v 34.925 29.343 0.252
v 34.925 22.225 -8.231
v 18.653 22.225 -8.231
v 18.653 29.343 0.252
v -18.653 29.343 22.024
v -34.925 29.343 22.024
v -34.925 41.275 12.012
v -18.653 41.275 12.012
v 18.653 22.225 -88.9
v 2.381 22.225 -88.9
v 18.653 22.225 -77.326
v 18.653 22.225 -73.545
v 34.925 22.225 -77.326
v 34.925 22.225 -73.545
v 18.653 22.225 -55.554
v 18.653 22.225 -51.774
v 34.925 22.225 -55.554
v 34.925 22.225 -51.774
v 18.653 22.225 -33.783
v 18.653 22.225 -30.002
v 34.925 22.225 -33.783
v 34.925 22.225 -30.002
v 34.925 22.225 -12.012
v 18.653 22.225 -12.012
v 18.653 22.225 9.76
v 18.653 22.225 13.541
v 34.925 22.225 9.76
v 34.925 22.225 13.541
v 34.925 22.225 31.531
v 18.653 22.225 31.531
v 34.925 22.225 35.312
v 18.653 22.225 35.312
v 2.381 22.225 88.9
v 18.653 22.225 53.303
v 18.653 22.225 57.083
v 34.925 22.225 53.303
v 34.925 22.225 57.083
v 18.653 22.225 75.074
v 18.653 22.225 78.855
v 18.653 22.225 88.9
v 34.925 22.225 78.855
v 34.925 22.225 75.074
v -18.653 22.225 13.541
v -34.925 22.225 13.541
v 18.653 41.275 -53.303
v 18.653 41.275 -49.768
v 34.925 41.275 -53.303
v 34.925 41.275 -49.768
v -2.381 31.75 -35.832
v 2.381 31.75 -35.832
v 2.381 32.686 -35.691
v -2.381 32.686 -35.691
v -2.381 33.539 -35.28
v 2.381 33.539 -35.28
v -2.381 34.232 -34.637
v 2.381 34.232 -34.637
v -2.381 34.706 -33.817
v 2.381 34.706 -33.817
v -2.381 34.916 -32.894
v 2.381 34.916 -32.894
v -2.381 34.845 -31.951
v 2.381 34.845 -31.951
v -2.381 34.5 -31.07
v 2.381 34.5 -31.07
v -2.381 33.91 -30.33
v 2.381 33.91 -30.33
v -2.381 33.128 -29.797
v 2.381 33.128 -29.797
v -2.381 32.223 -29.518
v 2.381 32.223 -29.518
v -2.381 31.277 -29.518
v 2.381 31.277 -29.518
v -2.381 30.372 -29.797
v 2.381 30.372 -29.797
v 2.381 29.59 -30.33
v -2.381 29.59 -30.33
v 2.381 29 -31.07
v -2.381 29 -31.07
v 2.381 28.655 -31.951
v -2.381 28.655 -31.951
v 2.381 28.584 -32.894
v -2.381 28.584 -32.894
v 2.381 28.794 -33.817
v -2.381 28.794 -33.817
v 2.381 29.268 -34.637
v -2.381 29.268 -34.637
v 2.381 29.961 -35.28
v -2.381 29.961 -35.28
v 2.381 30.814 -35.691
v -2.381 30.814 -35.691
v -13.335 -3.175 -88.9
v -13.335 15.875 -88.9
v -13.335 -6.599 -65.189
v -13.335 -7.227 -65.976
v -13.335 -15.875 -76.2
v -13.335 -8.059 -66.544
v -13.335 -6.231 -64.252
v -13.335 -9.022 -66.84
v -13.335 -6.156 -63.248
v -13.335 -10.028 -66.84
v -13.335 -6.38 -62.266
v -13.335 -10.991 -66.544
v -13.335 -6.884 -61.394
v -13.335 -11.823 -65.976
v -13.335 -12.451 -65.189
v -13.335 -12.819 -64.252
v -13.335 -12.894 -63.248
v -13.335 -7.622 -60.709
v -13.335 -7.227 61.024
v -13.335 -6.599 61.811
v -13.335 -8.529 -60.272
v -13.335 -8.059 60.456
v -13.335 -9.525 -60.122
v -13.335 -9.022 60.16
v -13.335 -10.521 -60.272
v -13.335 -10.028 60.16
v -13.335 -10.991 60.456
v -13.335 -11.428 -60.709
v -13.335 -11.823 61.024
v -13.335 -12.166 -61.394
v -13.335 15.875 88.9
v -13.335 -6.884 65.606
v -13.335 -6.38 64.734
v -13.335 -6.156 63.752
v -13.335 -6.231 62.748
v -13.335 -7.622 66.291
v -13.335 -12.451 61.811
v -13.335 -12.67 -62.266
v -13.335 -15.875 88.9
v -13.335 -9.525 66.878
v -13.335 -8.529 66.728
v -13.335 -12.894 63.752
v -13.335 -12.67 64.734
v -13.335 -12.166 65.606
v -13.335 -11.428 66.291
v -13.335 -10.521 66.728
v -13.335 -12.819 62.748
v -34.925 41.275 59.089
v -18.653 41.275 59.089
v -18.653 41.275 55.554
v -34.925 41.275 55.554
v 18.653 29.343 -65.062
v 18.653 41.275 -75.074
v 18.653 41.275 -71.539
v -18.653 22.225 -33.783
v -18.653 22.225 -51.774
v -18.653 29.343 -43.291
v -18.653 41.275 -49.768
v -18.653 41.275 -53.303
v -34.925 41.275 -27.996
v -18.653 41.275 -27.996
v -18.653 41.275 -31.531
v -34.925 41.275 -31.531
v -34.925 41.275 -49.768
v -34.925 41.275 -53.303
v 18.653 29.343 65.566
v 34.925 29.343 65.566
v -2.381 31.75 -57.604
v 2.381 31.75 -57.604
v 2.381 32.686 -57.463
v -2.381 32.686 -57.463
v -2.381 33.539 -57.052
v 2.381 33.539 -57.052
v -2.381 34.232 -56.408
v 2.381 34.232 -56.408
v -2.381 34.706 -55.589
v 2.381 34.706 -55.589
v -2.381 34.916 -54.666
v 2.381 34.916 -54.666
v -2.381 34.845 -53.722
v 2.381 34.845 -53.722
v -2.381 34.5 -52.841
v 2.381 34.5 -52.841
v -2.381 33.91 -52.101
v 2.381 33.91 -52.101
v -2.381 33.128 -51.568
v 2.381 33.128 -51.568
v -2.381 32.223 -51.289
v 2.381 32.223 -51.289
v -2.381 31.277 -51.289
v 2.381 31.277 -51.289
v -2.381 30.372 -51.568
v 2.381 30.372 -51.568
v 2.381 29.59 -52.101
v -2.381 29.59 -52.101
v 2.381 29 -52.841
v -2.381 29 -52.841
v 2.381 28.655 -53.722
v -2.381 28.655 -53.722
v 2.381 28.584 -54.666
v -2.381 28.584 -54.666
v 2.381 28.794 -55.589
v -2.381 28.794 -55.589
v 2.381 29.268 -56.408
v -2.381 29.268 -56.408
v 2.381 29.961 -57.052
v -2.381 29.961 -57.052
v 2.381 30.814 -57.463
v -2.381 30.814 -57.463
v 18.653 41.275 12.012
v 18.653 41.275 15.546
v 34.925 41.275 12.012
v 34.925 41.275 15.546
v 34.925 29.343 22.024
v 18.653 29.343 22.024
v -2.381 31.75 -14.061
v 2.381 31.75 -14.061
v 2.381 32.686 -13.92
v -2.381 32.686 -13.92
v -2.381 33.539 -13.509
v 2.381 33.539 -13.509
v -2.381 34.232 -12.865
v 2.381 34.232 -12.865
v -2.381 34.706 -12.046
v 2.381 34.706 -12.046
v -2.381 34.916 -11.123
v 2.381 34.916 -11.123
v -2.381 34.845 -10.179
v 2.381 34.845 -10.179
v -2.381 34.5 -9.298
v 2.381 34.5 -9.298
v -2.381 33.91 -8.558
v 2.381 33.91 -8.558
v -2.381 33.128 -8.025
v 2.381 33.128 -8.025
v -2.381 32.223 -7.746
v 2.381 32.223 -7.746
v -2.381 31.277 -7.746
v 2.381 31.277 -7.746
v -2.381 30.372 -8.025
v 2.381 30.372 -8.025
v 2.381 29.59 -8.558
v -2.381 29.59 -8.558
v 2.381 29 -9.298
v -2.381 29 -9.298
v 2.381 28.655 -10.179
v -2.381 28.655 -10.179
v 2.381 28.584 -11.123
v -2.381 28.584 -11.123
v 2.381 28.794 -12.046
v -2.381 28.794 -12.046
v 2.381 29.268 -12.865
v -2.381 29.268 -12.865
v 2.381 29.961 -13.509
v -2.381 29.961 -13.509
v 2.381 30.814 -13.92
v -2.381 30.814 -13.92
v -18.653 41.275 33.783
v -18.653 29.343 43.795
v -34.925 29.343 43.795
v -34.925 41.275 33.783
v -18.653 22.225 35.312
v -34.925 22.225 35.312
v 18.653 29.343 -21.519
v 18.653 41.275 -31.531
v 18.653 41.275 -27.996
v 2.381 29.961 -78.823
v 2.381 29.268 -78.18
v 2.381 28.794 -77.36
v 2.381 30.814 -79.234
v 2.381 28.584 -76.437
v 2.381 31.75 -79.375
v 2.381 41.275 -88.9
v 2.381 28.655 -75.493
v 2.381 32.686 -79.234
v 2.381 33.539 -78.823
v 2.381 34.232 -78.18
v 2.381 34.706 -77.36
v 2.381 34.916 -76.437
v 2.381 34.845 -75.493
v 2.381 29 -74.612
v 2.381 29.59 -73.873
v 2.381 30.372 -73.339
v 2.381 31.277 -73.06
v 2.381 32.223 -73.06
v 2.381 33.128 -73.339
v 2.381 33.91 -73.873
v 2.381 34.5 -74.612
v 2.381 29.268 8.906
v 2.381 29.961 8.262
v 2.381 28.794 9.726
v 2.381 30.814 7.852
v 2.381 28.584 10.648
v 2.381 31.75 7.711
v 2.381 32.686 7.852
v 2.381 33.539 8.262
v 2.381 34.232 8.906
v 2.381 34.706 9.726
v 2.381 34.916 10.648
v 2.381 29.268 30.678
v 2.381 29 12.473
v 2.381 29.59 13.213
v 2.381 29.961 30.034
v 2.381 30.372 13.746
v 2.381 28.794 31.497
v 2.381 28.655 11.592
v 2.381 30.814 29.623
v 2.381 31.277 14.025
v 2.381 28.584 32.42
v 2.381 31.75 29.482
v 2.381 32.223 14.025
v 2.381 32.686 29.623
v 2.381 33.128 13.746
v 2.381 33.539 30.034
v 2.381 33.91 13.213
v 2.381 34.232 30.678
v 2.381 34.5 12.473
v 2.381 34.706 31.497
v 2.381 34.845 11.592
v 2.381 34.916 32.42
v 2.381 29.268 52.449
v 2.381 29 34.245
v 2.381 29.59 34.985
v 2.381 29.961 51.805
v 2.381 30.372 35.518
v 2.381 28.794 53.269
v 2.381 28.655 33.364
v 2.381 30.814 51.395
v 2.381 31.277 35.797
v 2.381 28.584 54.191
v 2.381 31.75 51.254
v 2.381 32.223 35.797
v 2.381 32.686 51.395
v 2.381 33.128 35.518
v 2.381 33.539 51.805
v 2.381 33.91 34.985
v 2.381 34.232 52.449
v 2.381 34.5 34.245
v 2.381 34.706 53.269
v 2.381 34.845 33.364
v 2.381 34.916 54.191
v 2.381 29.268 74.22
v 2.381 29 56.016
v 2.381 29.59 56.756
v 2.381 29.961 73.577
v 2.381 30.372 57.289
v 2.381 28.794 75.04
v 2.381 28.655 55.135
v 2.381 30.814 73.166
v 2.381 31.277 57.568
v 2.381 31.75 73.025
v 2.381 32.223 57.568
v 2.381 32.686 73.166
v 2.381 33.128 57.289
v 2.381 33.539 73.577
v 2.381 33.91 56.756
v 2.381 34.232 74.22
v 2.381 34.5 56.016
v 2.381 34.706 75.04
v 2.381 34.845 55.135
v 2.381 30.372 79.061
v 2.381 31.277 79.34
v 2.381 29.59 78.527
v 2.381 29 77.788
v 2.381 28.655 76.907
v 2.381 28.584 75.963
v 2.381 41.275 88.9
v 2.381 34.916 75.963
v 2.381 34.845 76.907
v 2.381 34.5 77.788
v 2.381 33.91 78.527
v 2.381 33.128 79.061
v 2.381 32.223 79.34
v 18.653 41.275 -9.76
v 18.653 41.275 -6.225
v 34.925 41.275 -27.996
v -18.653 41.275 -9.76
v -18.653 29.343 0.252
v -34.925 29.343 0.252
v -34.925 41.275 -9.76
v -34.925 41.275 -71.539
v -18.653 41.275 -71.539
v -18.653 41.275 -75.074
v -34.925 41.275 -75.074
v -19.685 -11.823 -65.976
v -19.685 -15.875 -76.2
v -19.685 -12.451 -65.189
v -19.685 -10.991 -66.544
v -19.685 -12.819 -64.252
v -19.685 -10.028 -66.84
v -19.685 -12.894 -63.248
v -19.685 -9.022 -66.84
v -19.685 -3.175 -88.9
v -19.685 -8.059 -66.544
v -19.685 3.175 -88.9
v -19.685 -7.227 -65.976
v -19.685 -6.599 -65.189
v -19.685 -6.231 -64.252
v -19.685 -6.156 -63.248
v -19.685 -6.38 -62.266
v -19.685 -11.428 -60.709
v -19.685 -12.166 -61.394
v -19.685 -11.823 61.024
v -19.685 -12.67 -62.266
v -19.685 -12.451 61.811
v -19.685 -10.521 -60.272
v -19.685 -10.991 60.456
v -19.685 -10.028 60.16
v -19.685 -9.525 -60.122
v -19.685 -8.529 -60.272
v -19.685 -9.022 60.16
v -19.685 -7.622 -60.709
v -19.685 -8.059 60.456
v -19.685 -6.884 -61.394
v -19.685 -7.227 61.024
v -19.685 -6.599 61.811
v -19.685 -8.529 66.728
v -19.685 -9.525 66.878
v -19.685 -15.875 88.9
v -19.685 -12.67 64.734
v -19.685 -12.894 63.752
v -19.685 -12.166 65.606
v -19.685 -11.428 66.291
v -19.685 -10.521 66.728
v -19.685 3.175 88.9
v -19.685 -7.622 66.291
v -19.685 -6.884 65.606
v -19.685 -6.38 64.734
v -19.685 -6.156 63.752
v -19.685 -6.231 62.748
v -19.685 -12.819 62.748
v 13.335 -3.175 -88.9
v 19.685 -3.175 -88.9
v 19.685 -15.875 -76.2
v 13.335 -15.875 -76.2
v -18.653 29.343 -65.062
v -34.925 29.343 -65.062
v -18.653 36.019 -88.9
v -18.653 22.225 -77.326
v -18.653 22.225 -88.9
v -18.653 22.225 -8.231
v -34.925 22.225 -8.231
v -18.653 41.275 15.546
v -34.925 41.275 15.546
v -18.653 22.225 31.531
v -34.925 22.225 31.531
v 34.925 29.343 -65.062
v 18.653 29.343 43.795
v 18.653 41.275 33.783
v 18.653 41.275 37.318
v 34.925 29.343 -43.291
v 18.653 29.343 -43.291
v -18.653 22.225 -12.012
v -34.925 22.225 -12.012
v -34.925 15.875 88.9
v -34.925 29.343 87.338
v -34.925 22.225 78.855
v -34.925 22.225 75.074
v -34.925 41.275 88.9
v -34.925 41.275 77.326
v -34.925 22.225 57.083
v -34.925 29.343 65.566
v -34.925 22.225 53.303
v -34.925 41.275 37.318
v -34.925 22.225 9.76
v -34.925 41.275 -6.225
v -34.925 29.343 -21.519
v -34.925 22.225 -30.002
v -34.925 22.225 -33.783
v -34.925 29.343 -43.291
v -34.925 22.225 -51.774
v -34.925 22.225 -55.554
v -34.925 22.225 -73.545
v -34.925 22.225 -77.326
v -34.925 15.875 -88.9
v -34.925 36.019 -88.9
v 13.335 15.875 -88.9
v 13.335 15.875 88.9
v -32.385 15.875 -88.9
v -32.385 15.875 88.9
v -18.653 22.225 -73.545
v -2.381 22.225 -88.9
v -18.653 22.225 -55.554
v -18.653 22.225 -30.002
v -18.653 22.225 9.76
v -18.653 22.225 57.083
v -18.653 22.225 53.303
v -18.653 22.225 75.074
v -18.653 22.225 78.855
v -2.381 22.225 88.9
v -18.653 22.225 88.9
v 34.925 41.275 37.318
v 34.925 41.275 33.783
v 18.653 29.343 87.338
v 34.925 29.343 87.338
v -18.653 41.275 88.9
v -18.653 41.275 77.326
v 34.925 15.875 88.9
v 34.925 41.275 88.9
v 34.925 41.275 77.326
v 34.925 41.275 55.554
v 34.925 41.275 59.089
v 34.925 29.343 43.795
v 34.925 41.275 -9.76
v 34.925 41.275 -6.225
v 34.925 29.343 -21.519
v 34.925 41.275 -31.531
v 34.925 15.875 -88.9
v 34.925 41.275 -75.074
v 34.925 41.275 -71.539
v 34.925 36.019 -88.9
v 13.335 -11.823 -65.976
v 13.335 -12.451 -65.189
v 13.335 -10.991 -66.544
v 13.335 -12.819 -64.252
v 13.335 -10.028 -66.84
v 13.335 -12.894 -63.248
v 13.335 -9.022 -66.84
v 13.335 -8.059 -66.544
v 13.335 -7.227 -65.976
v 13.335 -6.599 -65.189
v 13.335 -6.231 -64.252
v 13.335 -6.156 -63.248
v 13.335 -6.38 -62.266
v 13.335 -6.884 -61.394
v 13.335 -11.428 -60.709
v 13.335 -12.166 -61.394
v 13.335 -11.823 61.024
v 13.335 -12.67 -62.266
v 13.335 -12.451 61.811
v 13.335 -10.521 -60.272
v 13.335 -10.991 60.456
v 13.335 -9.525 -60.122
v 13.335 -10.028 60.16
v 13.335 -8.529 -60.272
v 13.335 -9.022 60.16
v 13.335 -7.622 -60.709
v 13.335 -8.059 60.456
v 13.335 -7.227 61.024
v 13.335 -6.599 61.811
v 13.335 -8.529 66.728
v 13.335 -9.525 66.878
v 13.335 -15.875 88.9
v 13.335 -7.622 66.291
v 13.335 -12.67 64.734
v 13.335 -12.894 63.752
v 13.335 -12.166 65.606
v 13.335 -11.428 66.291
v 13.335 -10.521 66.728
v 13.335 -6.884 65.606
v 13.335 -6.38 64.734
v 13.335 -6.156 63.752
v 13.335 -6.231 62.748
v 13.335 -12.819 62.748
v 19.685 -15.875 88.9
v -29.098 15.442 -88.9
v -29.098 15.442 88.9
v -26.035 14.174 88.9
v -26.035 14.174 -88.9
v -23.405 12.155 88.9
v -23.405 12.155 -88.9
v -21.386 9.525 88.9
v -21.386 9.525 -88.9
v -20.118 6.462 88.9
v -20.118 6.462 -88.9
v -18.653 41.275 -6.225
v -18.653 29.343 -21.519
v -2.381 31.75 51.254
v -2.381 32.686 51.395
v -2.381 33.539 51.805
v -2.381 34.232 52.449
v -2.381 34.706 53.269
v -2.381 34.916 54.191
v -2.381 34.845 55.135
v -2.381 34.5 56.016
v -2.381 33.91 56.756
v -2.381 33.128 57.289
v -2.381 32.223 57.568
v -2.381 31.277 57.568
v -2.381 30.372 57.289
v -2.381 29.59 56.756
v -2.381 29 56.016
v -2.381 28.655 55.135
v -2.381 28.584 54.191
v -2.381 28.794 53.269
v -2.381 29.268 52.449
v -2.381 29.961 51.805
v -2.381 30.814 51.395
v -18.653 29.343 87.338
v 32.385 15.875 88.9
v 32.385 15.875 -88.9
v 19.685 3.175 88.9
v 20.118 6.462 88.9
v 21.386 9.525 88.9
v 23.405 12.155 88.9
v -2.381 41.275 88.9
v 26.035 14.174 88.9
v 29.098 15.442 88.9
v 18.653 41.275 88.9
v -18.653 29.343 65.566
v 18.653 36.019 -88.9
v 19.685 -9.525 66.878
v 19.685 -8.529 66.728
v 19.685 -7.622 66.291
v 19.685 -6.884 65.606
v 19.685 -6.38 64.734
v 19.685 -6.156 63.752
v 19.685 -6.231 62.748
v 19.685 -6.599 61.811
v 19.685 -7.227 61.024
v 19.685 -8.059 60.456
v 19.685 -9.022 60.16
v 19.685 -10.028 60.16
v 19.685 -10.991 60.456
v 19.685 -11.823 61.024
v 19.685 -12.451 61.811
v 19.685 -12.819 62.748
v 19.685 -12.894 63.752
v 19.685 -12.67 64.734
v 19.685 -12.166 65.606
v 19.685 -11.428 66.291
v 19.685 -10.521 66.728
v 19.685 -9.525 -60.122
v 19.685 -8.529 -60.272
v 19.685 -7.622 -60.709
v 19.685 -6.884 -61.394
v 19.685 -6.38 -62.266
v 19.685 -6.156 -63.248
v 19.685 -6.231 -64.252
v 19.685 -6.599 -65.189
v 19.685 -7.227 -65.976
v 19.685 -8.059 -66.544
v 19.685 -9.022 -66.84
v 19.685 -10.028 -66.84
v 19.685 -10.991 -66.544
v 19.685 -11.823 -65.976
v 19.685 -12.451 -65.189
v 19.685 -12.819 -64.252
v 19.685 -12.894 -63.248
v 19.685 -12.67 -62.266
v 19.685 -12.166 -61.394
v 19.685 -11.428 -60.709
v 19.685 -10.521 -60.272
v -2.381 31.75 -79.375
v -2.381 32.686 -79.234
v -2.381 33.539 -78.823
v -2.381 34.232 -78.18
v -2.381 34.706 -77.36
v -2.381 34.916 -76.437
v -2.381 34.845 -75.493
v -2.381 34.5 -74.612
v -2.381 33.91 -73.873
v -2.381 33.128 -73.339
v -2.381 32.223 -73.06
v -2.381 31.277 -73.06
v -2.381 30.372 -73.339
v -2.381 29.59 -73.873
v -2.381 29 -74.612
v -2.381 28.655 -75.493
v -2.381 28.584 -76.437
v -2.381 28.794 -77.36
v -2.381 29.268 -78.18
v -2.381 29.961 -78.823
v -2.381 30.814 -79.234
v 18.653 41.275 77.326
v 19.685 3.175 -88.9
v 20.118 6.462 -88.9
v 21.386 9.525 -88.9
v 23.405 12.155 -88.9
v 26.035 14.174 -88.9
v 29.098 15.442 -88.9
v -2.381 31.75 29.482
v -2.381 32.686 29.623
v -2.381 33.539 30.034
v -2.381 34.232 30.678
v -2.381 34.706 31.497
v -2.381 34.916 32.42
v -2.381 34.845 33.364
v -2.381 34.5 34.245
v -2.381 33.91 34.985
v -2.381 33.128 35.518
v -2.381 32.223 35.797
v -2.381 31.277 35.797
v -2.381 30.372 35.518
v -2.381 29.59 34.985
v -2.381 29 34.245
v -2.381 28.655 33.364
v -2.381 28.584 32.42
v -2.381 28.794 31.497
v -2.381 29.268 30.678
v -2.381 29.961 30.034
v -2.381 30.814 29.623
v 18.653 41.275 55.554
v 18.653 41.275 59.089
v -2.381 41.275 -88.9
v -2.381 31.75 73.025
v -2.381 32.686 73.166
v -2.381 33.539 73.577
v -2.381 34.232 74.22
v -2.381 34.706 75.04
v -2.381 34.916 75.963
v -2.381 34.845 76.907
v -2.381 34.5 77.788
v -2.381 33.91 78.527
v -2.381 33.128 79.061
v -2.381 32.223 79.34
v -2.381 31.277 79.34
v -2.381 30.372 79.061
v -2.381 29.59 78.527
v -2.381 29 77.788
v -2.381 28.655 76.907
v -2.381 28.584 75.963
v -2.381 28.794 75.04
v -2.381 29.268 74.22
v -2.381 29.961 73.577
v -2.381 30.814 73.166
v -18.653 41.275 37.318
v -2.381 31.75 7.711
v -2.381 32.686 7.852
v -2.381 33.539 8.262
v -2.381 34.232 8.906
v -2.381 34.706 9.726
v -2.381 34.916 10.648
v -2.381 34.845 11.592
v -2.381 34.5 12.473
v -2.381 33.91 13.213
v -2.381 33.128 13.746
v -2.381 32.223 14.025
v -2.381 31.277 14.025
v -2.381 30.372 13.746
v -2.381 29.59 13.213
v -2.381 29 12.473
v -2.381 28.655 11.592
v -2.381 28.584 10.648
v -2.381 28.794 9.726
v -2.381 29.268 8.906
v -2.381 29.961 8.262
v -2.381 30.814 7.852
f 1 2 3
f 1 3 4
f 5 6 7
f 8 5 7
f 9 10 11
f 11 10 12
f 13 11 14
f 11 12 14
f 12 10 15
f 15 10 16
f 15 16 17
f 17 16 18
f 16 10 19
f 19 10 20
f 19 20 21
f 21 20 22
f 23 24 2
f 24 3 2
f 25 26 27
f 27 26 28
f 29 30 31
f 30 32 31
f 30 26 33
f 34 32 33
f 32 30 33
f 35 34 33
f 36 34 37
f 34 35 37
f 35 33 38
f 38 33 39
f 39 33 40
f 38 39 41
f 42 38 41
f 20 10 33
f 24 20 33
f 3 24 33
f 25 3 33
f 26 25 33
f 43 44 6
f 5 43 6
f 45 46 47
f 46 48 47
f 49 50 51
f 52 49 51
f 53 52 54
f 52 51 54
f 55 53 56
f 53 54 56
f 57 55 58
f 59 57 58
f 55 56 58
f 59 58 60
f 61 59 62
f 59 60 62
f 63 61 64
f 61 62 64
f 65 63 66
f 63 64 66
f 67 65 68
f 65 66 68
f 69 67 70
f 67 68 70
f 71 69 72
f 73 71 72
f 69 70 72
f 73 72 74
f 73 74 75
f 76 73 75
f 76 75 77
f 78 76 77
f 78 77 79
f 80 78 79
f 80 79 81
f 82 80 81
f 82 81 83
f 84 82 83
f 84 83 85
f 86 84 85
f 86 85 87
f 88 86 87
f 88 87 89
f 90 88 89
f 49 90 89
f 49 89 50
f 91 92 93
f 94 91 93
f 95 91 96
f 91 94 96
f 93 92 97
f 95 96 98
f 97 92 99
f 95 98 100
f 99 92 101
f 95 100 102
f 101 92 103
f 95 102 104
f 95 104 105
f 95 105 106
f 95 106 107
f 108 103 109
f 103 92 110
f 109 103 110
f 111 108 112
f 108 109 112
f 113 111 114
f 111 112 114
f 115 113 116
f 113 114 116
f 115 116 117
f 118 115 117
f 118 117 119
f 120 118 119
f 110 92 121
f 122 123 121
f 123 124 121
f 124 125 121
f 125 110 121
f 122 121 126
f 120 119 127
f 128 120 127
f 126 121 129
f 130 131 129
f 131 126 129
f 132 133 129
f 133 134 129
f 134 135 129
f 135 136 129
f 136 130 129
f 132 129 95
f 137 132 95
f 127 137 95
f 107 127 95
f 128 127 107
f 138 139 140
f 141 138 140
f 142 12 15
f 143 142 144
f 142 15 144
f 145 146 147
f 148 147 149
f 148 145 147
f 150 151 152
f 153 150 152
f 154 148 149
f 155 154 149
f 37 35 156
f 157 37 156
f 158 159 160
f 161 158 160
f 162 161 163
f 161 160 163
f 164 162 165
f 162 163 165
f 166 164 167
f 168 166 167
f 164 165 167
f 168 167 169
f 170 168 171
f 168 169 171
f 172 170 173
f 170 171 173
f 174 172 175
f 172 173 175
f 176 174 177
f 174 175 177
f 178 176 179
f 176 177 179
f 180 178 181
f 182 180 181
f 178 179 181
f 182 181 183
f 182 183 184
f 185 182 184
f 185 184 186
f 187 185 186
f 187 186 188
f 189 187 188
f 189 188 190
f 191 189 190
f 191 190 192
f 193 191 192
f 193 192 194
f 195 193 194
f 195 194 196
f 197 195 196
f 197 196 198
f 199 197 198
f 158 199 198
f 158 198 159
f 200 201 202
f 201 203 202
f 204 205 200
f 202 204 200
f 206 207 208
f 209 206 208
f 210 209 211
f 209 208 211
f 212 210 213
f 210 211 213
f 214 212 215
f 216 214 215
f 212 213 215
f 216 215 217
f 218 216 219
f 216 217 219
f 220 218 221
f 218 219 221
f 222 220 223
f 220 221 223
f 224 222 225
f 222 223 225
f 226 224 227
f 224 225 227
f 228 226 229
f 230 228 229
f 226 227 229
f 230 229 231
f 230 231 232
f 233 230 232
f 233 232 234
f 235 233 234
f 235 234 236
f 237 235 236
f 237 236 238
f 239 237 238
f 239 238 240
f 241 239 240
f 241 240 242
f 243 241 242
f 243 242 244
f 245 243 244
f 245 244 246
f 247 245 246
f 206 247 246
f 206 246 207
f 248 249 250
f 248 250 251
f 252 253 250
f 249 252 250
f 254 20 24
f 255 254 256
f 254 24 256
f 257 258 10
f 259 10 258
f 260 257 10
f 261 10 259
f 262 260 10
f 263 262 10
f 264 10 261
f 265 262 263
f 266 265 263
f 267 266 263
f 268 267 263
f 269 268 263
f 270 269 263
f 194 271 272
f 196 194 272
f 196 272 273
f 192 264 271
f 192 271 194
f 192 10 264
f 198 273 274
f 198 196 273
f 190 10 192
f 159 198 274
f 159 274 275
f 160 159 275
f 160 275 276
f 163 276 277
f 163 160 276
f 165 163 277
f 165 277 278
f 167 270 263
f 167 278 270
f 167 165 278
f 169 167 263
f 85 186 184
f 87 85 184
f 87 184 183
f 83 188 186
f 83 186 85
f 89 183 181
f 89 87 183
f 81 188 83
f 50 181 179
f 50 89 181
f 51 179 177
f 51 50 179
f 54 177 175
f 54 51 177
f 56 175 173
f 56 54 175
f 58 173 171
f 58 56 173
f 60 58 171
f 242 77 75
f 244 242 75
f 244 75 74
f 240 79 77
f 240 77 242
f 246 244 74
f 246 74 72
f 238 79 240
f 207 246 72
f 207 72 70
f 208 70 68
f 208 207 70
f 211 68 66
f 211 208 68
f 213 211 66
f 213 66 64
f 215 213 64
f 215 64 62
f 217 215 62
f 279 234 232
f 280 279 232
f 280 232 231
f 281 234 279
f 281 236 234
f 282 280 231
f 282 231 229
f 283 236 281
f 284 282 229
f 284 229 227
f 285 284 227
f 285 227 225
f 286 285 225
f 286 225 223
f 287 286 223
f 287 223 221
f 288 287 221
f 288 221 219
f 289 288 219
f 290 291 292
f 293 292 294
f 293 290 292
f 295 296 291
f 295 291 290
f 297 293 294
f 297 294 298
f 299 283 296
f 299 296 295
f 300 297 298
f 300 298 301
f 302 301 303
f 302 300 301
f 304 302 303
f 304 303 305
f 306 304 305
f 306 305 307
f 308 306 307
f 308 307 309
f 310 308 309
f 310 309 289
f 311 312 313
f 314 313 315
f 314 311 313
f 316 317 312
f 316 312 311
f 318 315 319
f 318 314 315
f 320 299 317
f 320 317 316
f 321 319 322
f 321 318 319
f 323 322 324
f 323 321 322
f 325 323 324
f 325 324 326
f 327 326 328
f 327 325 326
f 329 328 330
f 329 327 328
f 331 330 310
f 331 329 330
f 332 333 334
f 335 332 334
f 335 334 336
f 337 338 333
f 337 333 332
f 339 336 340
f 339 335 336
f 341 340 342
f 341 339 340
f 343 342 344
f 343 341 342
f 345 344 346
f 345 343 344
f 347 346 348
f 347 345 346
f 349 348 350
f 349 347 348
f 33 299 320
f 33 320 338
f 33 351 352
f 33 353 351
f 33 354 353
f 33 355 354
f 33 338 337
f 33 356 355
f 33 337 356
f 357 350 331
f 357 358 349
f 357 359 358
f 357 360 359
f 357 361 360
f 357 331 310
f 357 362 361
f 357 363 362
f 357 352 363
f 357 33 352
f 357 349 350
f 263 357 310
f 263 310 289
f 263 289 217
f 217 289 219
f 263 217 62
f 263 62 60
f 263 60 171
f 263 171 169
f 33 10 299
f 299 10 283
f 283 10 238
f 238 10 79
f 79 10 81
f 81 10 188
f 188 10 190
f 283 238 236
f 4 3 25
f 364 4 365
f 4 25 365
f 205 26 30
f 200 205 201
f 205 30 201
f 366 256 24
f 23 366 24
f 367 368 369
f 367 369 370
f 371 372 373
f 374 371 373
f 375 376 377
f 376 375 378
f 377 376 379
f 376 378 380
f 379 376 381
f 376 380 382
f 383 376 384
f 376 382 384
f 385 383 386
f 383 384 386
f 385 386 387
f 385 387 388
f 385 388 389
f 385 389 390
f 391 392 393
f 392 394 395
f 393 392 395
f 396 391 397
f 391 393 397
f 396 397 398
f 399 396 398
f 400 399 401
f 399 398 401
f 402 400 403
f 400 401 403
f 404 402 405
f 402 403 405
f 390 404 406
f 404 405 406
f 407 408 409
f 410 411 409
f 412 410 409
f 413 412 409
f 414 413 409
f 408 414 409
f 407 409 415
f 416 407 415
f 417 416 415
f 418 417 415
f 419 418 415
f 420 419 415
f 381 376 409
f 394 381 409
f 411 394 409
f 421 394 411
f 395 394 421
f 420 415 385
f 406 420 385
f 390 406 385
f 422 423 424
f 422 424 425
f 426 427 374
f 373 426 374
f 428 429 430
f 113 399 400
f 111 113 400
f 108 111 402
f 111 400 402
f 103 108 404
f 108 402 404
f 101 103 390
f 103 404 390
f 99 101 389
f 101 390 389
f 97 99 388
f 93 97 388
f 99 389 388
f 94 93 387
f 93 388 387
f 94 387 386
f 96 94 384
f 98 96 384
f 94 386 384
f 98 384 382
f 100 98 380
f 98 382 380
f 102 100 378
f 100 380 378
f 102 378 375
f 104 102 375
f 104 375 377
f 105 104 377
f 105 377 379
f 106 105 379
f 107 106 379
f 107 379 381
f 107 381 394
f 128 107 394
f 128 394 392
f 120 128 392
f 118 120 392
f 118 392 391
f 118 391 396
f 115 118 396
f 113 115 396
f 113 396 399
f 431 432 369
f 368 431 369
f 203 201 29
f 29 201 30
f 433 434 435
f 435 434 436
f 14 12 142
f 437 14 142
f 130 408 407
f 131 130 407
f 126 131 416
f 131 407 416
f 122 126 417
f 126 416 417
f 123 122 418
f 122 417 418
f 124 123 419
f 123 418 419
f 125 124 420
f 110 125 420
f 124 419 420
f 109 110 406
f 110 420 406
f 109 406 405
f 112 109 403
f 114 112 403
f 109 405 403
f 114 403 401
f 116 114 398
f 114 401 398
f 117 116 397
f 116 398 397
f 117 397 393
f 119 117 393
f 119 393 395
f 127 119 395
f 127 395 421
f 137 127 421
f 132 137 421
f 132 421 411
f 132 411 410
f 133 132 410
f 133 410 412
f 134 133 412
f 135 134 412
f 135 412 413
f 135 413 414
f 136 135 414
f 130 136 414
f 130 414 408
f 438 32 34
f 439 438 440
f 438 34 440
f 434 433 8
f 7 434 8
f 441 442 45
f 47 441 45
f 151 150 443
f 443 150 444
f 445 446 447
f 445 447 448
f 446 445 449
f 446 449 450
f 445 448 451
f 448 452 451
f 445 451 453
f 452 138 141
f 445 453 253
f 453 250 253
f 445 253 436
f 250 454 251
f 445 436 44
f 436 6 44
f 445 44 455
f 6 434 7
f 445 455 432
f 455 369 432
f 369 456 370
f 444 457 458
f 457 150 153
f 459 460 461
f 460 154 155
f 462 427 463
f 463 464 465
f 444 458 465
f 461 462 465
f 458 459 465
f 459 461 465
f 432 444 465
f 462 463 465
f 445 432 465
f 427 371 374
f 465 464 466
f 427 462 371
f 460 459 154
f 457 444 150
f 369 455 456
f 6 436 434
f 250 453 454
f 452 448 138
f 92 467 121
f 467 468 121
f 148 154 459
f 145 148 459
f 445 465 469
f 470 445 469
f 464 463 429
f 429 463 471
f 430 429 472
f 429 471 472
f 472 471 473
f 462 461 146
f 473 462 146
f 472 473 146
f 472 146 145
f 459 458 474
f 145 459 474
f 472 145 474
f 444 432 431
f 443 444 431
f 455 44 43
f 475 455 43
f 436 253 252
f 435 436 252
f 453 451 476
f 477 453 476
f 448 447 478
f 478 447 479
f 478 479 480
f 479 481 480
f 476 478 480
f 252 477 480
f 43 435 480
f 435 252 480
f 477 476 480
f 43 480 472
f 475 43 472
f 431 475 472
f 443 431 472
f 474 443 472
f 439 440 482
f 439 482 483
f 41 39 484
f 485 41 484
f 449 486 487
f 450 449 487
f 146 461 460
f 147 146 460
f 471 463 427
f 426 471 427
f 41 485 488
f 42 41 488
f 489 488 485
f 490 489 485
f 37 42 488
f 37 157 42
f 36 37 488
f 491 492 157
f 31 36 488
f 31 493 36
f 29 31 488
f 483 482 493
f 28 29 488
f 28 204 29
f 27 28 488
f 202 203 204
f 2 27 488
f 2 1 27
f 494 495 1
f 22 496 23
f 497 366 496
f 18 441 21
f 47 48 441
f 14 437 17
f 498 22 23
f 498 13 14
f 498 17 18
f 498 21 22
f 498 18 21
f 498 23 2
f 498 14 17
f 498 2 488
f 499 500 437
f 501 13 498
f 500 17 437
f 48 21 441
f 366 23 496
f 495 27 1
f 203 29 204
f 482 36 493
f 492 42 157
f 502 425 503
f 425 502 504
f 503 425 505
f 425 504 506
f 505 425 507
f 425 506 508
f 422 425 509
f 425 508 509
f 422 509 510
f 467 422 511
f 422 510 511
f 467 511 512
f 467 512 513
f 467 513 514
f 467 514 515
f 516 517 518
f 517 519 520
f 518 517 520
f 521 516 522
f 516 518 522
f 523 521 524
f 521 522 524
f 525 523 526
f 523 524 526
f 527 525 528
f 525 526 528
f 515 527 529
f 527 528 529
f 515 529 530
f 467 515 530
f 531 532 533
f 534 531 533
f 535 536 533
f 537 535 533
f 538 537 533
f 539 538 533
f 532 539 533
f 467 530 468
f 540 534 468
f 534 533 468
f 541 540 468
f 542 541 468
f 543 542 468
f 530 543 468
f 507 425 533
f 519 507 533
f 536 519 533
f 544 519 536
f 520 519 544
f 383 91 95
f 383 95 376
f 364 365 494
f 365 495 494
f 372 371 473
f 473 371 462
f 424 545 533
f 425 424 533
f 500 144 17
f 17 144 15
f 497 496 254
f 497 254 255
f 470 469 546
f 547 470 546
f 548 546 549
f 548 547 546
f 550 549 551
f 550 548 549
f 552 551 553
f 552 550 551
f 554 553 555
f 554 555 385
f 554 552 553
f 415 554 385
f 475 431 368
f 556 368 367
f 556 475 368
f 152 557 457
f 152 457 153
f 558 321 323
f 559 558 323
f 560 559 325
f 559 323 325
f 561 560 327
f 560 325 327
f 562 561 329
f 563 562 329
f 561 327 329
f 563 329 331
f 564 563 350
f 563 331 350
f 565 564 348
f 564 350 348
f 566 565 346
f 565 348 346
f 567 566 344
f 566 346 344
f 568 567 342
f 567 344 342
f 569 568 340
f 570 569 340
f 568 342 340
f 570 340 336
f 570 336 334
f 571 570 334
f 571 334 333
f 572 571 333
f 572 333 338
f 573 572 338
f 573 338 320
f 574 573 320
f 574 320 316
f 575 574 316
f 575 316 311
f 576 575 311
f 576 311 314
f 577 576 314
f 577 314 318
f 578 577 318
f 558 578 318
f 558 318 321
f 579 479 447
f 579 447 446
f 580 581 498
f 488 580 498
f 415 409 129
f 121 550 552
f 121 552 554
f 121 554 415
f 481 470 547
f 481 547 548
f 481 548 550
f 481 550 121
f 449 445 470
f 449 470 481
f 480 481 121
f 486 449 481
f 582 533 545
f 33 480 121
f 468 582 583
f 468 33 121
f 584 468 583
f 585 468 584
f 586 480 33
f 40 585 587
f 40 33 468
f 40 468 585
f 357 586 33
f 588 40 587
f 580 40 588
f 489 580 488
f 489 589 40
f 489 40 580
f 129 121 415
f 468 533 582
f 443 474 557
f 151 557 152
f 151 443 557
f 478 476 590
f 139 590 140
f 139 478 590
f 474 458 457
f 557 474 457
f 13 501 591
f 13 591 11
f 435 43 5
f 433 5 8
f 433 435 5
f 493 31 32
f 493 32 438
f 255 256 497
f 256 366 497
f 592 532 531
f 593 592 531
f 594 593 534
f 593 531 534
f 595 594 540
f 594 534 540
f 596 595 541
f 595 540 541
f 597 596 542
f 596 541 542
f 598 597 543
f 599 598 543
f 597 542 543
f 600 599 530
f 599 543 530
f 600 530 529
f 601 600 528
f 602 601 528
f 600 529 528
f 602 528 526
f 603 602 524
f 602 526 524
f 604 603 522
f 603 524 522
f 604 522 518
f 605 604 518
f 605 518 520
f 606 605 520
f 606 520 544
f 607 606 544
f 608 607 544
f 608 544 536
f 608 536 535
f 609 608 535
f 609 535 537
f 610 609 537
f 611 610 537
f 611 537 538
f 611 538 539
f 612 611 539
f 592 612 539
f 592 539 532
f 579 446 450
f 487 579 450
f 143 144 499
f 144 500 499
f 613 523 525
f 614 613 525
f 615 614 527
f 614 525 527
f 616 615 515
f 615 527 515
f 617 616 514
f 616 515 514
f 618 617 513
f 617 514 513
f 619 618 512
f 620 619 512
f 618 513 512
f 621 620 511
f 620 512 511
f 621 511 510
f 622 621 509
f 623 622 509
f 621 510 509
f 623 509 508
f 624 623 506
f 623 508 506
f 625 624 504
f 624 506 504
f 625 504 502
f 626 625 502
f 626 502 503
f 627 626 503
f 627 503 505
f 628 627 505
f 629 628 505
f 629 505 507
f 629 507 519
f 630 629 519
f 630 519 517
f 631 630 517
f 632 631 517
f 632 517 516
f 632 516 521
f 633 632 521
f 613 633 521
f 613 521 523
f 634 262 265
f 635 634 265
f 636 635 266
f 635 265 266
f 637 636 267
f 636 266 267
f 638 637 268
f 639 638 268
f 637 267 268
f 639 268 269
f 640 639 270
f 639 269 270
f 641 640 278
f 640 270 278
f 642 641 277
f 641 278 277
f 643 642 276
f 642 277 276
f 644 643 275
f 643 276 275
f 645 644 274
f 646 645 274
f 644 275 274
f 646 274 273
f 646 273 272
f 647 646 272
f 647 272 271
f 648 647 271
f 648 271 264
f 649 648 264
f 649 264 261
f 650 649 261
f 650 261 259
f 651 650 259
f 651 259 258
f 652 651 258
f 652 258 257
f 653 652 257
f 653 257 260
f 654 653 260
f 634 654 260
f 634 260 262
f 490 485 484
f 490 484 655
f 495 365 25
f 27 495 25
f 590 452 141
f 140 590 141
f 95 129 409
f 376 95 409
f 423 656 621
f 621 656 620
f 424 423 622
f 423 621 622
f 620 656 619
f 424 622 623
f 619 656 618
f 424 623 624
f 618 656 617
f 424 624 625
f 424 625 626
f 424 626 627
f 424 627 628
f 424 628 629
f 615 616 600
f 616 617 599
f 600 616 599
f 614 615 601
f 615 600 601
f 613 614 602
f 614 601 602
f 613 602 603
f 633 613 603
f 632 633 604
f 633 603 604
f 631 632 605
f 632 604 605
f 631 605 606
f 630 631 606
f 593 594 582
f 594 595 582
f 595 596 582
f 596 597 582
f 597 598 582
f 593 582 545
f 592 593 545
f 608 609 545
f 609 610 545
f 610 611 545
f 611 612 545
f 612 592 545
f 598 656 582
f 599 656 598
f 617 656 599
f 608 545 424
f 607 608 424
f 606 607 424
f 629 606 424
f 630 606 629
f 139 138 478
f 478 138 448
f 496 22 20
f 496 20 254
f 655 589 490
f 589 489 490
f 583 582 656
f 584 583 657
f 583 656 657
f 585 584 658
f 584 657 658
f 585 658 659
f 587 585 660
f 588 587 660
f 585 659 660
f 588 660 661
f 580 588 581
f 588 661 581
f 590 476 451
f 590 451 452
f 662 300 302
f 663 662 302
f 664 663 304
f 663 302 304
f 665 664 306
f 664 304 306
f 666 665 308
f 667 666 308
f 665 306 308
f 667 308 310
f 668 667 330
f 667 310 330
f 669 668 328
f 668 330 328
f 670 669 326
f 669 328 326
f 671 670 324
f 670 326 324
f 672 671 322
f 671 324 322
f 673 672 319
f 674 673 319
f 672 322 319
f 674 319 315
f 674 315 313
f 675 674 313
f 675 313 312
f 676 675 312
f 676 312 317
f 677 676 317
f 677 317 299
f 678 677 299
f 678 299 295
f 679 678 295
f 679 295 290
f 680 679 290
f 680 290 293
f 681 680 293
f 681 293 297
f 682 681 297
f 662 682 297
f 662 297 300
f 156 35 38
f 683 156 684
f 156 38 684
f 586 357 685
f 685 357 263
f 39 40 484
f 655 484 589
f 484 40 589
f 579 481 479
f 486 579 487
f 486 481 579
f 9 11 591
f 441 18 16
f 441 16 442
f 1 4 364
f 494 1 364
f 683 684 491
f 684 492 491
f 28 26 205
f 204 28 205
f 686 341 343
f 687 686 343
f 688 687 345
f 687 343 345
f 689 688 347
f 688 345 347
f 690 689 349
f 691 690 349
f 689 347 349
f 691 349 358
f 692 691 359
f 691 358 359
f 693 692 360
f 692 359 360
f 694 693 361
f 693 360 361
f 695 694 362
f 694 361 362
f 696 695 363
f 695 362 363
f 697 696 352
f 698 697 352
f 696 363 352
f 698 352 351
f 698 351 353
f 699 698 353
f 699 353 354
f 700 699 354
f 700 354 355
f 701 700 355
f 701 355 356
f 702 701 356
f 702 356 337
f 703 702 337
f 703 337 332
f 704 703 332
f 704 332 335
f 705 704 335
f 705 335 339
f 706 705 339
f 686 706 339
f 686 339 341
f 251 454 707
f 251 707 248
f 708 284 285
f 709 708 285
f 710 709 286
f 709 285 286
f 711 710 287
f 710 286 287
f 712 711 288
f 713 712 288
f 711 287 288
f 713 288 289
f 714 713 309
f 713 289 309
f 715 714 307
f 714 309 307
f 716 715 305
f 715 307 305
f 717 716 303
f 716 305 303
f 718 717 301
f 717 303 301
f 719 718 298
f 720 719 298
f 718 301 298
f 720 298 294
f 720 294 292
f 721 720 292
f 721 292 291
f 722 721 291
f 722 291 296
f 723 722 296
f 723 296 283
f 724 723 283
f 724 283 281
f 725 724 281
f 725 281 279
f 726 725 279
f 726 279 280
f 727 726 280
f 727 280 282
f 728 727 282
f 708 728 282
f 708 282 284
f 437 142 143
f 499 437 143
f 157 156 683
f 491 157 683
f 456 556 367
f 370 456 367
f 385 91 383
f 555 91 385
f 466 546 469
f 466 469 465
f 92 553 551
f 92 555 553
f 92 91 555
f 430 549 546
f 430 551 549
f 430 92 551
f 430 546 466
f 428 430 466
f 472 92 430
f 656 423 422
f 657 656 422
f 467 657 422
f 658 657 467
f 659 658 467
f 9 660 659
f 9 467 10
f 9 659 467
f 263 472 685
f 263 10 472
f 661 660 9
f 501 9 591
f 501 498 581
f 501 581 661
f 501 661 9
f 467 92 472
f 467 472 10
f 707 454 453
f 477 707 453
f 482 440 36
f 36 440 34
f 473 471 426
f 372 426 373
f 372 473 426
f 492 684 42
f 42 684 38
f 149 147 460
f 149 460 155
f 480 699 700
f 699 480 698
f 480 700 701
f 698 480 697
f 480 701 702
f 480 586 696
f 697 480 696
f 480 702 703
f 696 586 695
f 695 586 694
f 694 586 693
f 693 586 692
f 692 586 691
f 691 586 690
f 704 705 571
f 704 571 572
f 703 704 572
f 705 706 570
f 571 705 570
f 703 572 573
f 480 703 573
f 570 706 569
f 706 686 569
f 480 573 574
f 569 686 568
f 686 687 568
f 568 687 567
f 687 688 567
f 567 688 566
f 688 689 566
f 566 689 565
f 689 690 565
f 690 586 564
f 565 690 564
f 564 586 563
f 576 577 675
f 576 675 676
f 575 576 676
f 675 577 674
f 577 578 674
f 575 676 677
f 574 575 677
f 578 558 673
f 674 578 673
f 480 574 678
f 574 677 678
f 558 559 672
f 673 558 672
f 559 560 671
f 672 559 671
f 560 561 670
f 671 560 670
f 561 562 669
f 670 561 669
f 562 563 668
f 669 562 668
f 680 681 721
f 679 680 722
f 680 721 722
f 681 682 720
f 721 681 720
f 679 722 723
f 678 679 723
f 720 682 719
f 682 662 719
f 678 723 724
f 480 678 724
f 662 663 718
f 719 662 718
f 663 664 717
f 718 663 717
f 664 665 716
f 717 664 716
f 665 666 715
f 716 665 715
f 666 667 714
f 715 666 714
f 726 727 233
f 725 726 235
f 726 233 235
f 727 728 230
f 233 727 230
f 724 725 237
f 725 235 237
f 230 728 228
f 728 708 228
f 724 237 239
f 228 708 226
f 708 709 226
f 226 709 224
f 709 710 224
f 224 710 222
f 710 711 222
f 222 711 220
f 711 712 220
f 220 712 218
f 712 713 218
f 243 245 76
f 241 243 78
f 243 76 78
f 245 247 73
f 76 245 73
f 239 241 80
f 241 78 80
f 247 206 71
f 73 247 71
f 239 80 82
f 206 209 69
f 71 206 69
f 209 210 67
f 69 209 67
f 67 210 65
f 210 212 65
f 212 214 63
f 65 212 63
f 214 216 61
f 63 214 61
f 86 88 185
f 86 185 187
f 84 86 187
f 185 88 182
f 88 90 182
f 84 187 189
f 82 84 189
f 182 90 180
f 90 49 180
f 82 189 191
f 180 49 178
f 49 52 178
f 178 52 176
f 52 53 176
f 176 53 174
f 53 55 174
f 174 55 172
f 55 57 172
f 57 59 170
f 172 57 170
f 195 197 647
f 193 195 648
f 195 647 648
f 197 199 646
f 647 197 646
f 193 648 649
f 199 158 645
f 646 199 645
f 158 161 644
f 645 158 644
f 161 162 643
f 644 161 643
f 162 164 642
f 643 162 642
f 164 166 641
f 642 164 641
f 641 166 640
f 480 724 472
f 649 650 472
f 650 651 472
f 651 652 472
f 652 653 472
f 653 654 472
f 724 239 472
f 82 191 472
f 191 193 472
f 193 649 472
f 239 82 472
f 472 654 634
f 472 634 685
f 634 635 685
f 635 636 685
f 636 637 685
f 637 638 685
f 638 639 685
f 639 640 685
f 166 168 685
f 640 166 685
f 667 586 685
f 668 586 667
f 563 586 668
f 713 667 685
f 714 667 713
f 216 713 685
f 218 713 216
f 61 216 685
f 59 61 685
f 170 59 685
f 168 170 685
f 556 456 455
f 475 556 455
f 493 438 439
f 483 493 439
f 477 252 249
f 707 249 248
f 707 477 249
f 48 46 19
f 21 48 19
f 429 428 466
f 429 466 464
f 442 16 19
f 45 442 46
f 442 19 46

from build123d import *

# Parameters (mm, degrees)
BOSS_EXTRUDE1_DEPTH             = 88.9
F_1_4_CLEARANCE_HOLE1_D         = 6.7564
CHAMFER1_SIZE                   = 12.7
SKETCH8_W                       = 69.85
SKETCH8_H                       = 177.8
BOSS_EXTRUDE4_DEPTH             = 6.35
SKETCH4_W                       = 177.8
SKETCH4_H                       = 19.05
BOSS_EXTRUDE2_DEPTH             = 2.38125
F_1_4_0_25_DIAMETER_HOLE1_D     = 6.35
F_1_4_0_25_DIAMETER_HOLE1_DEPTH = 11.938
F_1_4_0_25_DIAMETER_HOLE1_TIP   = 1.907732465
FILLET3_R                       = 12.7
BOSS_EXTRUDE7_DEPTH             = 34.925
SKETCH31_W                      = 16.271875
SKETCH31_H                      = 19.05
CUT_EXTRUDE1_DEPTH              = 186.839234959


with BuildPart() as part:
    # Sketch1 → Boss-Extrude1 (new, symmetric)
    with BuildSketch(Plane.XY):
        Polygon((-19.685, 22.225), (19.685, 22.225), (19.685, -15.875), (13.335, -15.875), (13.335, 15.875), (-13.335, 15.875), (-13.335, -15.875), (-19.685, -15.875), align=None)
    extrude(amount=BOSS_EXTRUDE1_DEPTH, both=True)

    # 1/4 Clearance Hole1 (through all)
    with Locations(Plane(origin=(19.685, 0, 0), x_dir=(0, 0, -1), z_dir=(1, 0, 0))):
        with Locations((-63.5, -9.525), (63.5, -9.525)):
            Hole(F_1_4_CLEARANCE_HOLE1_D / 2)

    # Chamfer1
    chamfer1_edges = [part.edges().sort_by_distance(p)[0] for p in [
        (16.51, -15.875, -88.9),
        (-16.51, -15.875, -88.9),
    ]]
    chamfer(chamfer1_edges, length=CHAMFER1_SIZE)

    # Sketch8 → Boss-Extrude4 (add)
    with BuildSketch(Plane(origin=(0, 22.225, 0), x_dir=(1, 0, 0), z_dir=(0, 1, 0))):
        Rectangle(SKETCH8_W, SKETCH8_H)
    extrude(amount=-BOSS_EXTRUDE4_DEPTH)

    # Sketch4 → Boss-Extrude2 (add, symmetric)
    with BuildSketch(Plane(origin=(0, 0, 0), x_dir=(0, 0, -1), z_dir=(1, 0, 0))):
        with Locations((0, 31.75)):
            Rectangle(SKETCH4_W, SKETCH4_H)
    extrude(amount=BOSS_EXTRUDE2_DEPTH, both=True)

    # 1/4 (0.25) Diameter Hole1
    with Locations(Plane.ZY.offset(2.38125)):
        with Locations((-76.2, 31.75), (76.2, 31.75), (54.428571429, 31.75), (32.657142857, 31.75), (10.885714286, 31.75), (-10.885714286, 31.75), (-32.657142857, 31.75), (-54.428571429, 31.75)):
            Hole(F_1_4_0_25_DIAMETER_HOLE1_D / 2, depth=F_1_4_0_25_DIAMETER_HOLE1_DEPTH)
            with Locations((0, 0, -(F_1_4_0_25_DIAMETER_HOLE1_DEPTH + F_1_4_0_25_DIAMETER_HOLE1_TIP / 2))):  # 118° drill point
                Cone(0, F_1_4_0_25_DIAMETER_HOLE1_D / 2, F_1_4_0_25_DIAMETER_HOLE1_TIP, mode=Mode.SUBTRACT)

    # Fillet3
    fillet3_edges = [part.edges().sort_by_distance(p)[0] for p in [
        (19.685, 15.875, 0),
        (-19.685, 15.875, 0),
    ]]
    fillet(fillet3_edges, radius=FILLET3_R)

    # Sketch30 → Boss-Extrude7 (add, symmetric)
    with BuildSketch(Plane(origin=(0, 0, 0), x_dir=(0, 0, -1), z_dir=(1, 0, 0))):
        Polygon((-88.9, 41.275), (-88.9, 27.481460305), (-87.337897471, 29.343101606), (-77.325845929, 41.275), align=None)
        Polygon((-59.089306097, 41.275), (-75.074154071, 22.225), (-71.539265332, 22.225), (-65.566468899, 29.343101606), (-55.554417358, 41.275), align=None)
        Polygon((-37.317877526, 41.275), (-53.3027255, 22.225), (-49.76783676, 22.225), (-43.795040328, 29.343101606), (-33.782988786, 41.275), align=None)
        Polygon((-12.011560215, 41.275), (-15.546448954, 41.275), (-31.531296928, 22.225), (-27.996408189, 22.225), (-22.023611756, 29.343101606), align=None)
        Polygon((9.759868357, 41.275), (6.224979617, 41.275), (-9.759868357, 22.225), (-6.224979617, 22.225), (-0.252183185, 29.343101606), align=None)
        Polygon((31.531296928, 41.275), (27.996408189, 41.275), (12.011560215, 22.225), (15.546448954, 22.225), (21.519245386, 29.343101606), align=None)
        Polygon((53.3027255, 41.275), (49.76783676, 41.275), (33.782988786, 22.225), (37.317877526, 22.225), (43.290673958, 29.343101606), align=None)
        Polygon((75.074154071, 41.275), (71.539265332, 41.275), (55.554417358, 22.225), (59.089306097, 22.225), (65.062102529, 29.343101606), align=None)
        Polygon((-88.9, 27.481460305), (-88.9, 22.225), (-78.854874309, 22.225), (-87.337897471, 29.343101606), align=None)
        Polygon((-65.566468899, 29.343101606), (-71.539265332, 22.225), (-57.083445738, 22.225), align=None)
        Polygon((-43.795040328, 29.343101606), (-49.76783676, 22.225), (-35.312017166, 22.225), align=None)
        Polygon((-22.023611756, 29.343101606), (-27.996408189, 22.225), (-13.540588595, 22.225), align=None)
        Polygon((8.230839976, 22.225), (-0.252183185, 29.343101606), (-6.224979617, 22.225), align=None)
        Polygon((30.002268548, 22.225), (21.519245386, 29.343101606), (15.546448954, 22.225), align=None)
        Polygon((51.773697119, 22.225), (43.290673958, 29.343101606), (37.317877526, 22.225), align=None)
        Polygon((73.545125691, 22.225), (65.062102529, 29.343101606), (59.089306097, 22.225), align=None)
        Polygon((88.9, 22.225), (88.9, 36.018539695), (77.325845929, 22.225), align=None)
    extrude(amount=BOSS_EXTRUDE7_DEPTH, both=True)

    # Sketch31 → Cut-Extrude1 (cut, through all)
    with BuildSketch(Plane.XY.offset(88.9)):
        with Locations((10.5171875, 31.75)):
            Rectangle(SKETCH31_W, SKETCH31_H)
        with Locations((-10.5171875, 31.75)):
            Rectangle(SKETCH31_W, SKETCH31_H)
    extrude(amount=-CUT_EXTRUDE1_DEPTH, mode=Mode.SUBTRACT)


solid = part.part
